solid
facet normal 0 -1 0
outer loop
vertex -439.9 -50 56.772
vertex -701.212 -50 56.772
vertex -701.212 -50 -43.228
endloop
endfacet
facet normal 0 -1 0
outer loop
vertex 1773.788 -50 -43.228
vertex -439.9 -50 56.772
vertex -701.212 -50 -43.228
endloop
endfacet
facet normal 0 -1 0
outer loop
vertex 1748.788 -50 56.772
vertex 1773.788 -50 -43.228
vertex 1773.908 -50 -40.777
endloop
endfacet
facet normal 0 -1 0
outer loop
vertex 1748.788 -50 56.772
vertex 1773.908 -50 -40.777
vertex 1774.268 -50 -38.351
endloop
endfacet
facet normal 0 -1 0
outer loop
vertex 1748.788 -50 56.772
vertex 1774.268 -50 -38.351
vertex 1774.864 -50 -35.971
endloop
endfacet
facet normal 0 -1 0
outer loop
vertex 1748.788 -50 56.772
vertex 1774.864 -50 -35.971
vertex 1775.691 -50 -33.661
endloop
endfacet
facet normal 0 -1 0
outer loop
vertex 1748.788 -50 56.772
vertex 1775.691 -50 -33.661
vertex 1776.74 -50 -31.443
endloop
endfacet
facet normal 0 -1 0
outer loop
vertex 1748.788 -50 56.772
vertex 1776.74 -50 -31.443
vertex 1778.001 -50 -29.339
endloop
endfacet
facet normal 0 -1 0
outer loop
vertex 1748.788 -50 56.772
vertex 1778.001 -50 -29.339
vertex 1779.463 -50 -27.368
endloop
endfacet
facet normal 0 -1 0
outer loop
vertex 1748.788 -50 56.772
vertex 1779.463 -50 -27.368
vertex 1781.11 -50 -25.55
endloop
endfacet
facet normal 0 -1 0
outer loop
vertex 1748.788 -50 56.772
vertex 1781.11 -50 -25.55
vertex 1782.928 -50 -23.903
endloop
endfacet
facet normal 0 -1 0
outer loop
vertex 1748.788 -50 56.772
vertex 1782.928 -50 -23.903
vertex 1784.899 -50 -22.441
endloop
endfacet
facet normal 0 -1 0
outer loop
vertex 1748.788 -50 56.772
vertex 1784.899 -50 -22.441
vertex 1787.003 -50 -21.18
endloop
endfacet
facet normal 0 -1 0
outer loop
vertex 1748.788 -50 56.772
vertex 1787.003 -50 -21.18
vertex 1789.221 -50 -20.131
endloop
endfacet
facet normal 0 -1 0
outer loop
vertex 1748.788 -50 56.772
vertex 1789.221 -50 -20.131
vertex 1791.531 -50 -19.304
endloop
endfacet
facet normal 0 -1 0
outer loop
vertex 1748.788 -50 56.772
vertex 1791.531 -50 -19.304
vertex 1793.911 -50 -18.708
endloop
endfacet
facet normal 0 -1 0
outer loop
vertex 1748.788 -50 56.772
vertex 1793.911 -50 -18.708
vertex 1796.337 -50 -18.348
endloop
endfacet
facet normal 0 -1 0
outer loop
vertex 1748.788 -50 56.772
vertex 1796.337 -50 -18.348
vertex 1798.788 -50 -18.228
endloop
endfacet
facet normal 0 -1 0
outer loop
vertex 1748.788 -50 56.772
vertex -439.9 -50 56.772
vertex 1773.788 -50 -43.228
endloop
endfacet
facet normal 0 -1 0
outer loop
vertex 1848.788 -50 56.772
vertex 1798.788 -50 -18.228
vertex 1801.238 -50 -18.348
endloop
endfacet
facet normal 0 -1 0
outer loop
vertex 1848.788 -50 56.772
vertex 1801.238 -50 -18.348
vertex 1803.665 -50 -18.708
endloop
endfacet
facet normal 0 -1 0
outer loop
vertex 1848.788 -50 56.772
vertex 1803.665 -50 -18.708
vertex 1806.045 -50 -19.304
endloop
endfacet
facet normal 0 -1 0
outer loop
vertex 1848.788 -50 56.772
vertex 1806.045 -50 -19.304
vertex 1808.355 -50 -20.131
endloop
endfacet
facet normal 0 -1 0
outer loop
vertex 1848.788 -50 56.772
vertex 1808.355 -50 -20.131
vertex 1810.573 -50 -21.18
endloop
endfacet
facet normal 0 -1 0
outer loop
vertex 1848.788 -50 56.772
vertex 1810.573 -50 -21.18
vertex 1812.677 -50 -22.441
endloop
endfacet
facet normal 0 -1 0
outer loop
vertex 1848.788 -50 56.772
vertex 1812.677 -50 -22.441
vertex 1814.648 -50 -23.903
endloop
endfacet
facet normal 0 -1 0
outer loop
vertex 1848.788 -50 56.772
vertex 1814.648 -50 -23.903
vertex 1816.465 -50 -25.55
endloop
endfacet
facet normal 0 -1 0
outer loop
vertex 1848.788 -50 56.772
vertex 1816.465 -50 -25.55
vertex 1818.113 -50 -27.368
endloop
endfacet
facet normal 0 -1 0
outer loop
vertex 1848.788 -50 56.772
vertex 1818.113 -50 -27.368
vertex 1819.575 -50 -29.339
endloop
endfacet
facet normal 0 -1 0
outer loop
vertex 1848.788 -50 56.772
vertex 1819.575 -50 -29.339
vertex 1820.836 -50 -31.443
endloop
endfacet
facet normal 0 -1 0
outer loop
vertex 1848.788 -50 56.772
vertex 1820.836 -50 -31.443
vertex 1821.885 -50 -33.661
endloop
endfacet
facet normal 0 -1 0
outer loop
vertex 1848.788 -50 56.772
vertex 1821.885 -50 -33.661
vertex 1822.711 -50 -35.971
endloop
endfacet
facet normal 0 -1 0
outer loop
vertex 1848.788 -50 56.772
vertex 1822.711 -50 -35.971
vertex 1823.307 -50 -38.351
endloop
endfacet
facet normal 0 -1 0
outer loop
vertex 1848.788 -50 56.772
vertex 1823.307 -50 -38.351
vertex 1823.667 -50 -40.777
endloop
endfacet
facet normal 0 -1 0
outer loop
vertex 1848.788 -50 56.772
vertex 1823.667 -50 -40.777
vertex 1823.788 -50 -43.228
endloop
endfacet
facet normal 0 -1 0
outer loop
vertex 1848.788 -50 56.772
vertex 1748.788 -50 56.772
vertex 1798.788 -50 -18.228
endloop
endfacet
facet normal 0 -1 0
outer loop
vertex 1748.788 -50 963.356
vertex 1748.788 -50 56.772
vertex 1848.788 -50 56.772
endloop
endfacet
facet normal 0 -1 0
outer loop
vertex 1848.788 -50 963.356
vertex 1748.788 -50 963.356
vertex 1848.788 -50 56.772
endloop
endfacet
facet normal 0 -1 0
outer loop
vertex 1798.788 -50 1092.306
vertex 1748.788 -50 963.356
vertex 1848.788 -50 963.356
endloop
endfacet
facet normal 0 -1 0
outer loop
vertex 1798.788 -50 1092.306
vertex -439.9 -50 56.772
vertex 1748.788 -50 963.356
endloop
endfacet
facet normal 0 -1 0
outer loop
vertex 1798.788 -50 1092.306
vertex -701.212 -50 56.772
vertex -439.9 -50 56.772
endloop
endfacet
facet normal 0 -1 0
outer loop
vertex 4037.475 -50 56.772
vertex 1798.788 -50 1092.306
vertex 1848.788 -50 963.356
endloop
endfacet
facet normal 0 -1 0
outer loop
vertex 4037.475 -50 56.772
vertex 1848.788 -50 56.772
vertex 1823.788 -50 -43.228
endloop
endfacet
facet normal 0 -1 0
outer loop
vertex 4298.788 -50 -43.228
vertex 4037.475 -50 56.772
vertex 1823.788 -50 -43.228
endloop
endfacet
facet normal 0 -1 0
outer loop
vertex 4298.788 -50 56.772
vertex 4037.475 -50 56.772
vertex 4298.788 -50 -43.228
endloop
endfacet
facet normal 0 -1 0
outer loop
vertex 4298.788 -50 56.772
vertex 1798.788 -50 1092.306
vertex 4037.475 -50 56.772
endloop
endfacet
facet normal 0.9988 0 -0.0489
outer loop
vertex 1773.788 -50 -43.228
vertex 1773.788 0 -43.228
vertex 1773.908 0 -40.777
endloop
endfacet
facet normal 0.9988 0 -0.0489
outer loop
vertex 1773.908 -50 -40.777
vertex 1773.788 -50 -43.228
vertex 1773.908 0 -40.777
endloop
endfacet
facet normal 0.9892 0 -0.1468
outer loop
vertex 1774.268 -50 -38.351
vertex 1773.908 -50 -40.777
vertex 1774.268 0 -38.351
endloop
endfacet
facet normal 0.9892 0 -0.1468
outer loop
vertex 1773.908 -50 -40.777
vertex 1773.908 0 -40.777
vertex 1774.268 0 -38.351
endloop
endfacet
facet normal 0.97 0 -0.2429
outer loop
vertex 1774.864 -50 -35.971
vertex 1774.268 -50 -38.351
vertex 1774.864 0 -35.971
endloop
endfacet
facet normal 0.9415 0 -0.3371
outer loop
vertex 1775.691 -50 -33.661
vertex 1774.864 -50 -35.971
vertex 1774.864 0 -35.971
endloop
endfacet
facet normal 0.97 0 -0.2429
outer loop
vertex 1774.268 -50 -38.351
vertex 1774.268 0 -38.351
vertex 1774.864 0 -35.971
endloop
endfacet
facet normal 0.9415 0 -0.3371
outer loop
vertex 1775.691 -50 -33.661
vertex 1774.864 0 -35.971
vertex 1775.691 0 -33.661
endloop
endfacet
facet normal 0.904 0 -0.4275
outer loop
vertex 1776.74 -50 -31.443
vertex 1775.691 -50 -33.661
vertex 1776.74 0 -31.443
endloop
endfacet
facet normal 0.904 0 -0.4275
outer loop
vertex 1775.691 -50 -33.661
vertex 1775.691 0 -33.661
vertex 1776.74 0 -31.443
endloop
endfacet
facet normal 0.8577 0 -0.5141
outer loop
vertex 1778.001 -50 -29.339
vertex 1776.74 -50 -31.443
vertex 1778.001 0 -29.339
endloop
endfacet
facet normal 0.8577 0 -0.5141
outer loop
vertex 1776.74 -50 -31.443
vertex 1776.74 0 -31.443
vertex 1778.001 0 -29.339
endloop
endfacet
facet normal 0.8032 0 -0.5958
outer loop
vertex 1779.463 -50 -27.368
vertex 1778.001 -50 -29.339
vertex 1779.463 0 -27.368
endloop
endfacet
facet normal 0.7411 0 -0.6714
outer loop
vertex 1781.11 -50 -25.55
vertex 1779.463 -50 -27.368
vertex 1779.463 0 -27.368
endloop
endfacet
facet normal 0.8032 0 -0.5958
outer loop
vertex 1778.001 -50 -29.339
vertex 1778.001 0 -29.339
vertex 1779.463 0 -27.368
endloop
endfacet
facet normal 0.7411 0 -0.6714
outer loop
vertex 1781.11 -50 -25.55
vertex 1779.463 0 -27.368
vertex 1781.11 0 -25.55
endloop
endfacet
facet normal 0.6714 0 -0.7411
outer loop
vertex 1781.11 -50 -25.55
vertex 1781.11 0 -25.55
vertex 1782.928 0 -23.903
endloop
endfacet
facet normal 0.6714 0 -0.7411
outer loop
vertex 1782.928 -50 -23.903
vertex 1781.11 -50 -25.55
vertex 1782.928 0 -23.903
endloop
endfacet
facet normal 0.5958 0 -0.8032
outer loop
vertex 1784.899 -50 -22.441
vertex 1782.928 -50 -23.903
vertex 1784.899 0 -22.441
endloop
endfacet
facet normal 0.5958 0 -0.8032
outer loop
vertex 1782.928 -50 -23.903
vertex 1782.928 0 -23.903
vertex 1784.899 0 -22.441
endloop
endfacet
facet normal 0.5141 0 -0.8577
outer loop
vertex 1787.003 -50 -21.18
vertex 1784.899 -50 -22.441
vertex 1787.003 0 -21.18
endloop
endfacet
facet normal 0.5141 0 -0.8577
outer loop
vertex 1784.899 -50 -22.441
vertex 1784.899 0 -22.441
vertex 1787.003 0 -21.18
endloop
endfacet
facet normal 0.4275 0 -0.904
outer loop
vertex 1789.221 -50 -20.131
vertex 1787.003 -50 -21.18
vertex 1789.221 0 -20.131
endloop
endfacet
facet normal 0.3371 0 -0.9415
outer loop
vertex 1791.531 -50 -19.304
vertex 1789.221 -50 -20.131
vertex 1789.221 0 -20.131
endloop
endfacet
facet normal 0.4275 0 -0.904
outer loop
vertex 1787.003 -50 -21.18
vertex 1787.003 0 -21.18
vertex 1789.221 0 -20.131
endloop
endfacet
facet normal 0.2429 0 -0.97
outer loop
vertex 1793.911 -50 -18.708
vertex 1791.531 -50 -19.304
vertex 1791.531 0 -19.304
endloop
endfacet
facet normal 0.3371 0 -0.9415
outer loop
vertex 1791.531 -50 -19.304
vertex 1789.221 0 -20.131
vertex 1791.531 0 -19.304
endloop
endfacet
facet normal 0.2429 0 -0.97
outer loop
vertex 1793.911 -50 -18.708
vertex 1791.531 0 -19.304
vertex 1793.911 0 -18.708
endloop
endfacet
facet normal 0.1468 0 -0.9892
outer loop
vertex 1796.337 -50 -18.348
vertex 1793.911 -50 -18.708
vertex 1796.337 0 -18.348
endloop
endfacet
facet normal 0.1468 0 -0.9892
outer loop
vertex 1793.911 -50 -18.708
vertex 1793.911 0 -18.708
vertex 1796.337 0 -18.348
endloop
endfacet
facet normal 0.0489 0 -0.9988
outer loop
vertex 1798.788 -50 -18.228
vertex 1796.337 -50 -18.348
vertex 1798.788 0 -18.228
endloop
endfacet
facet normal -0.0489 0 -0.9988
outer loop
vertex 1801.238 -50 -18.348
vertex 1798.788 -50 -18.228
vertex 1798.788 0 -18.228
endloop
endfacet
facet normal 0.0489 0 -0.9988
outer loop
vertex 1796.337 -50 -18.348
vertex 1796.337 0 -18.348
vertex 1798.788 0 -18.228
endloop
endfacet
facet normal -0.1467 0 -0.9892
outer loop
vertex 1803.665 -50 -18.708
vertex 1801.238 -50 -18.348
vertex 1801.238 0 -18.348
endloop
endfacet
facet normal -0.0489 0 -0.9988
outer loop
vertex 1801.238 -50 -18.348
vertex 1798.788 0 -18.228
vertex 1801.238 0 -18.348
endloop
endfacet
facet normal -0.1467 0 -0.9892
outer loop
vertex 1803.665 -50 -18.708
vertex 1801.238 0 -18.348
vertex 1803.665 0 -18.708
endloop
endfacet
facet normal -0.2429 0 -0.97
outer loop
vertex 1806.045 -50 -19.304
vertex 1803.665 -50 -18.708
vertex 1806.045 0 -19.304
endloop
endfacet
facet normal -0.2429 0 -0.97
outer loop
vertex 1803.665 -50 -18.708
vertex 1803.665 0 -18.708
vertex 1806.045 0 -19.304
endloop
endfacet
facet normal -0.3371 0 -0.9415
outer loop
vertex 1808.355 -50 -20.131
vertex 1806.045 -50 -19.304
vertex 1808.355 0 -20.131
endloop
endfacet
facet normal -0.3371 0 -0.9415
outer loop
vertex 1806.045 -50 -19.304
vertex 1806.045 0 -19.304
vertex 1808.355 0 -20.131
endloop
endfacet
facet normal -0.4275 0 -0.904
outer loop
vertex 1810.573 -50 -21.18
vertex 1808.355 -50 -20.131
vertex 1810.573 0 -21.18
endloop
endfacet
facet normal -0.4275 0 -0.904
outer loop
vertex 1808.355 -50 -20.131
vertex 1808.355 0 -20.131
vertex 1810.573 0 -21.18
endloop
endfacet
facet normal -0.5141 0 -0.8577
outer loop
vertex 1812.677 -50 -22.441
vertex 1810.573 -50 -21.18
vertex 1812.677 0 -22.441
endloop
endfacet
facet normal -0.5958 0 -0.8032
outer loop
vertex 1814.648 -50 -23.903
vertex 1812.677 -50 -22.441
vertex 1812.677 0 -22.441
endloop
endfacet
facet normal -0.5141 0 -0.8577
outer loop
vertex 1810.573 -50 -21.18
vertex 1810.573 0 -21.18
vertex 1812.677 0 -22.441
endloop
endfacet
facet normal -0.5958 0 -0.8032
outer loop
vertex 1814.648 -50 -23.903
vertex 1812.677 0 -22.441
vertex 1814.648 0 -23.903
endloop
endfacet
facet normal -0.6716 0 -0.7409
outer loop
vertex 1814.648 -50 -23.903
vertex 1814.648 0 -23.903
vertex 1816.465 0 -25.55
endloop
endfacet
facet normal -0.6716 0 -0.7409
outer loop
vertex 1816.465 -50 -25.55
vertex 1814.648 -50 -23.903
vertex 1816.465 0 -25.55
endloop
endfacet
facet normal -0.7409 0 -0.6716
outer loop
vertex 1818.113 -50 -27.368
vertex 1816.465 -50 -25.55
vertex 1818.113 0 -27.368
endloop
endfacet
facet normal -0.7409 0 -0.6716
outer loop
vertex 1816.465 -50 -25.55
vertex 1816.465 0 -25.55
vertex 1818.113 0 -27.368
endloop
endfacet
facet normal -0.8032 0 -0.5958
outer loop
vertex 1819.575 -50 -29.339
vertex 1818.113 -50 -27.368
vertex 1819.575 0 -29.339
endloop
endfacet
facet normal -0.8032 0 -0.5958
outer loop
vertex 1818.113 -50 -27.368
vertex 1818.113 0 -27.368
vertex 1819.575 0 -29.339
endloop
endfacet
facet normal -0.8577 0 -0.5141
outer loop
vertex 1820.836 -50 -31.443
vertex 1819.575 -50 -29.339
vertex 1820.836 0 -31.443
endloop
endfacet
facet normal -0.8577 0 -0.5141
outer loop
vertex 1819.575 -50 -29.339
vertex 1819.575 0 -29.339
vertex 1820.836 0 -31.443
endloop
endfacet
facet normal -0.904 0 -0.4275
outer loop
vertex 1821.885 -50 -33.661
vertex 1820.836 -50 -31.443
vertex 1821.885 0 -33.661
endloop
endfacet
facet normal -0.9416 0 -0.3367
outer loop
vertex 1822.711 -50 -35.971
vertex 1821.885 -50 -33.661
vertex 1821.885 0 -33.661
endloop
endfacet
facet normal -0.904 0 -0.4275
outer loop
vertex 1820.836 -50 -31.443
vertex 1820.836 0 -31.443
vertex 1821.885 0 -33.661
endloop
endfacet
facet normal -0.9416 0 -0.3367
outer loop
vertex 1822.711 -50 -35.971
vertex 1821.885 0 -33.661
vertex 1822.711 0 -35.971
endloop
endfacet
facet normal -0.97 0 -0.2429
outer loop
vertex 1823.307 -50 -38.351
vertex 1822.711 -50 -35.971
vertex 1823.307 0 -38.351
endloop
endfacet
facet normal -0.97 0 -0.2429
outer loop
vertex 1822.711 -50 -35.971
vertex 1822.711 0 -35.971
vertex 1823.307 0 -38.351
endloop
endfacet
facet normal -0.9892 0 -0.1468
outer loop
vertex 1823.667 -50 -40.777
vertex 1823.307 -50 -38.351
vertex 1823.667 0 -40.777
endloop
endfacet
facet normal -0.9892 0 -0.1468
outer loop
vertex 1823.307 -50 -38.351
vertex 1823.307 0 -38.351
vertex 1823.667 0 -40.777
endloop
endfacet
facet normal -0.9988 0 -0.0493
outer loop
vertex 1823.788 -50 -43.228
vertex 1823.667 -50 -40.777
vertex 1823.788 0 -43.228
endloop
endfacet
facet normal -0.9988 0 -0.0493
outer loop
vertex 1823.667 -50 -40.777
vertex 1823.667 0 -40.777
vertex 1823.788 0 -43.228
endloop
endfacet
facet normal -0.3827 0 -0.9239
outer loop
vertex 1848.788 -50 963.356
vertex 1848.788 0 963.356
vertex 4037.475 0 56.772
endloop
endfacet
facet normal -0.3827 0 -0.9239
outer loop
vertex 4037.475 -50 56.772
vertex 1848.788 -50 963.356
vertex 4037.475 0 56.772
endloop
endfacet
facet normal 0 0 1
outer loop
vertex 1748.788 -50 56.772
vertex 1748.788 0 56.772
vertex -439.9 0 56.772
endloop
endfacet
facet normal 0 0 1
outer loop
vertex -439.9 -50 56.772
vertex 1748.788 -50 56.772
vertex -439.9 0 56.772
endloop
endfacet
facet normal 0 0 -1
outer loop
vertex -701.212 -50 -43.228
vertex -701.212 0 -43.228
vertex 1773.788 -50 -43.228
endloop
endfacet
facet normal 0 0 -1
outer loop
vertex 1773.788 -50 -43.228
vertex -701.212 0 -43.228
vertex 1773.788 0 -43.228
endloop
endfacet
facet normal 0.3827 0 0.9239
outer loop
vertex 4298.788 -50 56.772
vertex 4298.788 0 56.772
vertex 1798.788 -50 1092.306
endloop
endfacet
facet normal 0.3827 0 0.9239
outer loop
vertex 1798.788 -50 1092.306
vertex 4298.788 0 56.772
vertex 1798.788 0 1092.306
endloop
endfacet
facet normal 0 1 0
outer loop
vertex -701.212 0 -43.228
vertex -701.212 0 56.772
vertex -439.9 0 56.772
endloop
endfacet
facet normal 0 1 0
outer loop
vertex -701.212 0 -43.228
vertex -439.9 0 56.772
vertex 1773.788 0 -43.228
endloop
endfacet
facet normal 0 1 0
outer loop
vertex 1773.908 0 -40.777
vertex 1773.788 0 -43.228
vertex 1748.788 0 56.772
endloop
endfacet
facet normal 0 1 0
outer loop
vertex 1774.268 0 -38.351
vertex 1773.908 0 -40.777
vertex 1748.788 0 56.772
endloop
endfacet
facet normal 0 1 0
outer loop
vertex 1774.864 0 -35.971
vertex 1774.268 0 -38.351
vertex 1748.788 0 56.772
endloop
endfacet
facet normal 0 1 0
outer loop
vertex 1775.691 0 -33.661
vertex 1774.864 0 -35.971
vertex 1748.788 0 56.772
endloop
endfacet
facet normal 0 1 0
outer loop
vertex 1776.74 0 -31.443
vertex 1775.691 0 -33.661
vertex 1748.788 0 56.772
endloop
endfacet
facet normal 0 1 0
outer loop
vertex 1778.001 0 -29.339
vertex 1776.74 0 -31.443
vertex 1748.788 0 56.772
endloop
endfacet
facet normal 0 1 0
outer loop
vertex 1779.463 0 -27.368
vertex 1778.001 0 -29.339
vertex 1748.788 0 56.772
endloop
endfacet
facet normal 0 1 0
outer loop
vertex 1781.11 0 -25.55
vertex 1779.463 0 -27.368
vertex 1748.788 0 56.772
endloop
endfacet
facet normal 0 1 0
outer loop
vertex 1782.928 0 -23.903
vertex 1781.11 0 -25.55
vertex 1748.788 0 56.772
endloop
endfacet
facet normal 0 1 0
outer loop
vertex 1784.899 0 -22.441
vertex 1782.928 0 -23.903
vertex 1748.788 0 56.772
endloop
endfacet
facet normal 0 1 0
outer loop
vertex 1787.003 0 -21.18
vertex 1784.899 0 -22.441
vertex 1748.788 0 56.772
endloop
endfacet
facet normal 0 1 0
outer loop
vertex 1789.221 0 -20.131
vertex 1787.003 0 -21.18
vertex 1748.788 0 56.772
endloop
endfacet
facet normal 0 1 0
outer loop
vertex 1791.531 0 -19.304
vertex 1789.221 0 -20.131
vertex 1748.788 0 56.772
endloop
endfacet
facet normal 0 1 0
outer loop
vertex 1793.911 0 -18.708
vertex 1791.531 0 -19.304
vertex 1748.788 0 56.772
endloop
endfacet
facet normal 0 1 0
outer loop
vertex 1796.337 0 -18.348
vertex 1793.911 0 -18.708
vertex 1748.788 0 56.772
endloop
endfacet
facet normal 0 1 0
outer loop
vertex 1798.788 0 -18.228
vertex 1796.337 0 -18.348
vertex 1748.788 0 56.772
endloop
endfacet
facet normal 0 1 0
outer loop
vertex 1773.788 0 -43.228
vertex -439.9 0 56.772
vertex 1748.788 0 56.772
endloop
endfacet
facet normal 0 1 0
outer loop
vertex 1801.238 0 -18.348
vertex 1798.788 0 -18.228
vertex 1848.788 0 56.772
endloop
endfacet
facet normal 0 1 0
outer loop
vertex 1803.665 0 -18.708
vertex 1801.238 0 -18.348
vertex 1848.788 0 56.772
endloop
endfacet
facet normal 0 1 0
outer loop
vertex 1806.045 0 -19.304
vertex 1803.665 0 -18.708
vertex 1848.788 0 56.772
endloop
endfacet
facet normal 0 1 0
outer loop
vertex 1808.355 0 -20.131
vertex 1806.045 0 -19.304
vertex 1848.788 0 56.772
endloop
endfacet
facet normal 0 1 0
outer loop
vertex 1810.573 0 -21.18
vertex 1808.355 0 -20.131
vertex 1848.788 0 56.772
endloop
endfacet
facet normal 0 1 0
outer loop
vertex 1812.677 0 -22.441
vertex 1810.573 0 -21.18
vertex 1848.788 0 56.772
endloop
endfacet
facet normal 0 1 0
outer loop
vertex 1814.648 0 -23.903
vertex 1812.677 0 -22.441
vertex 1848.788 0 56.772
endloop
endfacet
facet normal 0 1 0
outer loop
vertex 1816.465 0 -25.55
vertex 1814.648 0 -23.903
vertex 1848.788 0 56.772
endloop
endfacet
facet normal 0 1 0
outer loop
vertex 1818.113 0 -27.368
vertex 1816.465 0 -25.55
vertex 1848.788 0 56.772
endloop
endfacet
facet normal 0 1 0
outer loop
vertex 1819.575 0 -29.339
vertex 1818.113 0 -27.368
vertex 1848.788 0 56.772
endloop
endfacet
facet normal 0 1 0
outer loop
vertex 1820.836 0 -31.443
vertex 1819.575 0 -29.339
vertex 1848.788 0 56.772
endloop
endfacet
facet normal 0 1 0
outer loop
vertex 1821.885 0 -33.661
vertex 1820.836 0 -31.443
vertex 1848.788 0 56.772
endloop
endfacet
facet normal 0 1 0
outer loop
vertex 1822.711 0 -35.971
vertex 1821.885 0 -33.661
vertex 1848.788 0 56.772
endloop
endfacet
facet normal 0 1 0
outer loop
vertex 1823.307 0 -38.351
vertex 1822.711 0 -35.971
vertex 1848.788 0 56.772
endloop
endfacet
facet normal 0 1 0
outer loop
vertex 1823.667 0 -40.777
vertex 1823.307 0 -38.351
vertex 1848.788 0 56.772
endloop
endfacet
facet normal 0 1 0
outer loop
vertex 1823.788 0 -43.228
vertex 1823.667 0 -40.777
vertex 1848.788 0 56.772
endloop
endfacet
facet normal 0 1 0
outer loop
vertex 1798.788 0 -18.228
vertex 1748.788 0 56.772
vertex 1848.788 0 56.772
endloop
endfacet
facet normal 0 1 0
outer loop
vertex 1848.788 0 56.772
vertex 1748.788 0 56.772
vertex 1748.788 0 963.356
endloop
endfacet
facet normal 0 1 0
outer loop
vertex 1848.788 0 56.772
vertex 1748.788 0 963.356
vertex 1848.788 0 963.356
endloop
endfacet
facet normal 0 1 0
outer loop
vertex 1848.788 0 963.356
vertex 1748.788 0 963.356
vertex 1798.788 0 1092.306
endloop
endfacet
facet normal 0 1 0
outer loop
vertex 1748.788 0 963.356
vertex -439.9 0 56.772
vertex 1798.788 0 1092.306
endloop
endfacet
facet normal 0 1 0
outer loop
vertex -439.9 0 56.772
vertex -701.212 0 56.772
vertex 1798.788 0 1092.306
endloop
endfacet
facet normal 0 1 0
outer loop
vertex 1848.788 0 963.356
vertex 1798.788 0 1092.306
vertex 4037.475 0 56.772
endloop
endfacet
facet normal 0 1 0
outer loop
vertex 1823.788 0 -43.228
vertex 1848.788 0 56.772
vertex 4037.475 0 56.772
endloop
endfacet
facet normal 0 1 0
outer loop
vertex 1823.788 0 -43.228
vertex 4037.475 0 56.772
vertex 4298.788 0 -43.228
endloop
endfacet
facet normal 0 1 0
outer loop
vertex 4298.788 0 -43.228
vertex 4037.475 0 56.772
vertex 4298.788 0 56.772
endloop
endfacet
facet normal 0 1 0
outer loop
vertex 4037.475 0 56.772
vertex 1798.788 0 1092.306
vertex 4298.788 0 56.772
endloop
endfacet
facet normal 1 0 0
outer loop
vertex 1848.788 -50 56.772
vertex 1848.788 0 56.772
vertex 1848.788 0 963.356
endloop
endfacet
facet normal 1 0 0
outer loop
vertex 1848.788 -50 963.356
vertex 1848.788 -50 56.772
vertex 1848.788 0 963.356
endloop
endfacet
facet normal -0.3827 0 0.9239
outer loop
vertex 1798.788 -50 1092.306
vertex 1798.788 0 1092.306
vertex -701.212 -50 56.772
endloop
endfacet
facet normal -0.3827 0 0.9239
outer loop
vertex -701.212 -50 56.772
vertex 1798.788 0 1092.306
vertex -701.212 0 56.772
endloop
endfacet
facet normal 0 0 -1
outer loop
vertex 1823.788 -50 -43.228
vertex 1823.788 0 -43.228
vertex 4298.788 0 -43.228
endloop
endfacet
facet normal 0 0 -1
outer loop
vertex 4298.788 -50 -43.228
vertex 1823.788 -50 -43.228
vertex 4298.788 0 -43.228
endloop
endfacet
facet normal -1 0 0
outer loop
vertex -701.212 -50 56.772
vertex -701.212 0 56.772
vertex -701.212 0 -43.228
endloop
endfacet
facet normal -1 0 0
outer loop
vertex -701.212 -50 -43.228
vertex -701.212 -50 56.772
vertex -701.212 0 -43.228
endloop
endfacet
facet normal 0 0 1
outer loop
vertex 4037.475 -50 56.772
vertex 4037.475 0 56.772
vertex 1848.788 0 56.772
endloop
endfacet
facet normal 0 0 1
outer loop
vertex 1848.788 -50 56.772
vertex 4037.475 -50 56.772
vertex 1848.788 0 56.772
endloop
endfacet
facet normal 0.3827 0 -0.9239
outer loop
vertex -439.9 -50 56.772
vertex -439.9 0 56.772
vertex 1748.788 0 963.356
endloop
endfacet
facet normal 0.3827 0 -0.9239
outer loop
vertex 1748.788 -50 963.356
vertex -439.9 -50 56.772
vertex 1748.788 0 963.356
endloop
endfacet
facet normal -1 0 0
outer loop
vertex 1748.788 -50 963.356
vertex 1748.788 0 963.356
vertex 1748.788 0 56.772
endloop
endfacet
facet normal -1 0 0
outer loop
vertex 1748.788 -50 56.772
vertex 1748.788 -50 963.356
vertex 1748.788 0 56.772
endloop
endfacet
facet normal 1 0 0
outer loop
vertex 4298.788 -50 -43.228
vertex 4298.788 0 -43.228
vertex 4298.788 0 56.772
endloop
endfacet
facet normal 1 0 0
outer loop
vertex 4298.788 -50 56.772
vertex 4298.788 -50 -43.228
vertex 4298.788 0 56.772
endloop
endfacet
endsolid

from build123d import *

# Parameters (mm, degrees)
F1_DEPTH = 50


with BuildPart() as f1:
    # F0 (on Front) → F1 (new body)
    with BuildSketch(Plane.XZ):
        Polygon((1798.787785, 1092.306019), (-701.212215, 56.772113), (-439.899622, 56.772113), (1748.787785, 963.356121), (1798.787785, 984.066799), align=None)
        Polygon((1748.787785, 963.356121), (1748.787785, 56.772113), (1798.787785, 56.772113), (1848.787785, 56.772113), (1848.787785, 963.356121), (1798.787785, 984.066799), align=None)
        Polygon((4298.787785, 56.772113), (1798.787785, 1092.306019), (1798.787785, 984.066799), (1848.787785, 963.356121), (4037.475192, 56.772113), align=None)
        with BuildLine():
            Line((-439.899622, 56.772113), (-701.212215, 56.772113))
            Line((-701.212215, 56.772113), (-701.212215, -43.227887))
            Line((-701.212215, -43.227887), (1773.787785, -43.227887))
            ThreePointArc((1773.787785, -43.227887), (1798.787785, -18.227887), (1823.787785, -43.227887))
            Line((1823.787785, -43.227887), (4298.787785, -43.227887))
            Line((4298.787785, -43.227887), (4298.787785, 56.772113))
            Line((4298.787785, 56.772113), (4037.475192, 56.772113))
            Line((4037.475192, 56.772113), (1848.787785, 56.772113))
            Line((1848.787785, 56.772113), (1798.787785, 56.772113))
            Line((1798.787785, 56.772113), (1748.787785, 56.772113))
            Line((1748.787785, 56.772113), (-439.899622, 56.772113))
        make_face()
    extrude(amount=F1_DEPTH)


solid = f1.part
